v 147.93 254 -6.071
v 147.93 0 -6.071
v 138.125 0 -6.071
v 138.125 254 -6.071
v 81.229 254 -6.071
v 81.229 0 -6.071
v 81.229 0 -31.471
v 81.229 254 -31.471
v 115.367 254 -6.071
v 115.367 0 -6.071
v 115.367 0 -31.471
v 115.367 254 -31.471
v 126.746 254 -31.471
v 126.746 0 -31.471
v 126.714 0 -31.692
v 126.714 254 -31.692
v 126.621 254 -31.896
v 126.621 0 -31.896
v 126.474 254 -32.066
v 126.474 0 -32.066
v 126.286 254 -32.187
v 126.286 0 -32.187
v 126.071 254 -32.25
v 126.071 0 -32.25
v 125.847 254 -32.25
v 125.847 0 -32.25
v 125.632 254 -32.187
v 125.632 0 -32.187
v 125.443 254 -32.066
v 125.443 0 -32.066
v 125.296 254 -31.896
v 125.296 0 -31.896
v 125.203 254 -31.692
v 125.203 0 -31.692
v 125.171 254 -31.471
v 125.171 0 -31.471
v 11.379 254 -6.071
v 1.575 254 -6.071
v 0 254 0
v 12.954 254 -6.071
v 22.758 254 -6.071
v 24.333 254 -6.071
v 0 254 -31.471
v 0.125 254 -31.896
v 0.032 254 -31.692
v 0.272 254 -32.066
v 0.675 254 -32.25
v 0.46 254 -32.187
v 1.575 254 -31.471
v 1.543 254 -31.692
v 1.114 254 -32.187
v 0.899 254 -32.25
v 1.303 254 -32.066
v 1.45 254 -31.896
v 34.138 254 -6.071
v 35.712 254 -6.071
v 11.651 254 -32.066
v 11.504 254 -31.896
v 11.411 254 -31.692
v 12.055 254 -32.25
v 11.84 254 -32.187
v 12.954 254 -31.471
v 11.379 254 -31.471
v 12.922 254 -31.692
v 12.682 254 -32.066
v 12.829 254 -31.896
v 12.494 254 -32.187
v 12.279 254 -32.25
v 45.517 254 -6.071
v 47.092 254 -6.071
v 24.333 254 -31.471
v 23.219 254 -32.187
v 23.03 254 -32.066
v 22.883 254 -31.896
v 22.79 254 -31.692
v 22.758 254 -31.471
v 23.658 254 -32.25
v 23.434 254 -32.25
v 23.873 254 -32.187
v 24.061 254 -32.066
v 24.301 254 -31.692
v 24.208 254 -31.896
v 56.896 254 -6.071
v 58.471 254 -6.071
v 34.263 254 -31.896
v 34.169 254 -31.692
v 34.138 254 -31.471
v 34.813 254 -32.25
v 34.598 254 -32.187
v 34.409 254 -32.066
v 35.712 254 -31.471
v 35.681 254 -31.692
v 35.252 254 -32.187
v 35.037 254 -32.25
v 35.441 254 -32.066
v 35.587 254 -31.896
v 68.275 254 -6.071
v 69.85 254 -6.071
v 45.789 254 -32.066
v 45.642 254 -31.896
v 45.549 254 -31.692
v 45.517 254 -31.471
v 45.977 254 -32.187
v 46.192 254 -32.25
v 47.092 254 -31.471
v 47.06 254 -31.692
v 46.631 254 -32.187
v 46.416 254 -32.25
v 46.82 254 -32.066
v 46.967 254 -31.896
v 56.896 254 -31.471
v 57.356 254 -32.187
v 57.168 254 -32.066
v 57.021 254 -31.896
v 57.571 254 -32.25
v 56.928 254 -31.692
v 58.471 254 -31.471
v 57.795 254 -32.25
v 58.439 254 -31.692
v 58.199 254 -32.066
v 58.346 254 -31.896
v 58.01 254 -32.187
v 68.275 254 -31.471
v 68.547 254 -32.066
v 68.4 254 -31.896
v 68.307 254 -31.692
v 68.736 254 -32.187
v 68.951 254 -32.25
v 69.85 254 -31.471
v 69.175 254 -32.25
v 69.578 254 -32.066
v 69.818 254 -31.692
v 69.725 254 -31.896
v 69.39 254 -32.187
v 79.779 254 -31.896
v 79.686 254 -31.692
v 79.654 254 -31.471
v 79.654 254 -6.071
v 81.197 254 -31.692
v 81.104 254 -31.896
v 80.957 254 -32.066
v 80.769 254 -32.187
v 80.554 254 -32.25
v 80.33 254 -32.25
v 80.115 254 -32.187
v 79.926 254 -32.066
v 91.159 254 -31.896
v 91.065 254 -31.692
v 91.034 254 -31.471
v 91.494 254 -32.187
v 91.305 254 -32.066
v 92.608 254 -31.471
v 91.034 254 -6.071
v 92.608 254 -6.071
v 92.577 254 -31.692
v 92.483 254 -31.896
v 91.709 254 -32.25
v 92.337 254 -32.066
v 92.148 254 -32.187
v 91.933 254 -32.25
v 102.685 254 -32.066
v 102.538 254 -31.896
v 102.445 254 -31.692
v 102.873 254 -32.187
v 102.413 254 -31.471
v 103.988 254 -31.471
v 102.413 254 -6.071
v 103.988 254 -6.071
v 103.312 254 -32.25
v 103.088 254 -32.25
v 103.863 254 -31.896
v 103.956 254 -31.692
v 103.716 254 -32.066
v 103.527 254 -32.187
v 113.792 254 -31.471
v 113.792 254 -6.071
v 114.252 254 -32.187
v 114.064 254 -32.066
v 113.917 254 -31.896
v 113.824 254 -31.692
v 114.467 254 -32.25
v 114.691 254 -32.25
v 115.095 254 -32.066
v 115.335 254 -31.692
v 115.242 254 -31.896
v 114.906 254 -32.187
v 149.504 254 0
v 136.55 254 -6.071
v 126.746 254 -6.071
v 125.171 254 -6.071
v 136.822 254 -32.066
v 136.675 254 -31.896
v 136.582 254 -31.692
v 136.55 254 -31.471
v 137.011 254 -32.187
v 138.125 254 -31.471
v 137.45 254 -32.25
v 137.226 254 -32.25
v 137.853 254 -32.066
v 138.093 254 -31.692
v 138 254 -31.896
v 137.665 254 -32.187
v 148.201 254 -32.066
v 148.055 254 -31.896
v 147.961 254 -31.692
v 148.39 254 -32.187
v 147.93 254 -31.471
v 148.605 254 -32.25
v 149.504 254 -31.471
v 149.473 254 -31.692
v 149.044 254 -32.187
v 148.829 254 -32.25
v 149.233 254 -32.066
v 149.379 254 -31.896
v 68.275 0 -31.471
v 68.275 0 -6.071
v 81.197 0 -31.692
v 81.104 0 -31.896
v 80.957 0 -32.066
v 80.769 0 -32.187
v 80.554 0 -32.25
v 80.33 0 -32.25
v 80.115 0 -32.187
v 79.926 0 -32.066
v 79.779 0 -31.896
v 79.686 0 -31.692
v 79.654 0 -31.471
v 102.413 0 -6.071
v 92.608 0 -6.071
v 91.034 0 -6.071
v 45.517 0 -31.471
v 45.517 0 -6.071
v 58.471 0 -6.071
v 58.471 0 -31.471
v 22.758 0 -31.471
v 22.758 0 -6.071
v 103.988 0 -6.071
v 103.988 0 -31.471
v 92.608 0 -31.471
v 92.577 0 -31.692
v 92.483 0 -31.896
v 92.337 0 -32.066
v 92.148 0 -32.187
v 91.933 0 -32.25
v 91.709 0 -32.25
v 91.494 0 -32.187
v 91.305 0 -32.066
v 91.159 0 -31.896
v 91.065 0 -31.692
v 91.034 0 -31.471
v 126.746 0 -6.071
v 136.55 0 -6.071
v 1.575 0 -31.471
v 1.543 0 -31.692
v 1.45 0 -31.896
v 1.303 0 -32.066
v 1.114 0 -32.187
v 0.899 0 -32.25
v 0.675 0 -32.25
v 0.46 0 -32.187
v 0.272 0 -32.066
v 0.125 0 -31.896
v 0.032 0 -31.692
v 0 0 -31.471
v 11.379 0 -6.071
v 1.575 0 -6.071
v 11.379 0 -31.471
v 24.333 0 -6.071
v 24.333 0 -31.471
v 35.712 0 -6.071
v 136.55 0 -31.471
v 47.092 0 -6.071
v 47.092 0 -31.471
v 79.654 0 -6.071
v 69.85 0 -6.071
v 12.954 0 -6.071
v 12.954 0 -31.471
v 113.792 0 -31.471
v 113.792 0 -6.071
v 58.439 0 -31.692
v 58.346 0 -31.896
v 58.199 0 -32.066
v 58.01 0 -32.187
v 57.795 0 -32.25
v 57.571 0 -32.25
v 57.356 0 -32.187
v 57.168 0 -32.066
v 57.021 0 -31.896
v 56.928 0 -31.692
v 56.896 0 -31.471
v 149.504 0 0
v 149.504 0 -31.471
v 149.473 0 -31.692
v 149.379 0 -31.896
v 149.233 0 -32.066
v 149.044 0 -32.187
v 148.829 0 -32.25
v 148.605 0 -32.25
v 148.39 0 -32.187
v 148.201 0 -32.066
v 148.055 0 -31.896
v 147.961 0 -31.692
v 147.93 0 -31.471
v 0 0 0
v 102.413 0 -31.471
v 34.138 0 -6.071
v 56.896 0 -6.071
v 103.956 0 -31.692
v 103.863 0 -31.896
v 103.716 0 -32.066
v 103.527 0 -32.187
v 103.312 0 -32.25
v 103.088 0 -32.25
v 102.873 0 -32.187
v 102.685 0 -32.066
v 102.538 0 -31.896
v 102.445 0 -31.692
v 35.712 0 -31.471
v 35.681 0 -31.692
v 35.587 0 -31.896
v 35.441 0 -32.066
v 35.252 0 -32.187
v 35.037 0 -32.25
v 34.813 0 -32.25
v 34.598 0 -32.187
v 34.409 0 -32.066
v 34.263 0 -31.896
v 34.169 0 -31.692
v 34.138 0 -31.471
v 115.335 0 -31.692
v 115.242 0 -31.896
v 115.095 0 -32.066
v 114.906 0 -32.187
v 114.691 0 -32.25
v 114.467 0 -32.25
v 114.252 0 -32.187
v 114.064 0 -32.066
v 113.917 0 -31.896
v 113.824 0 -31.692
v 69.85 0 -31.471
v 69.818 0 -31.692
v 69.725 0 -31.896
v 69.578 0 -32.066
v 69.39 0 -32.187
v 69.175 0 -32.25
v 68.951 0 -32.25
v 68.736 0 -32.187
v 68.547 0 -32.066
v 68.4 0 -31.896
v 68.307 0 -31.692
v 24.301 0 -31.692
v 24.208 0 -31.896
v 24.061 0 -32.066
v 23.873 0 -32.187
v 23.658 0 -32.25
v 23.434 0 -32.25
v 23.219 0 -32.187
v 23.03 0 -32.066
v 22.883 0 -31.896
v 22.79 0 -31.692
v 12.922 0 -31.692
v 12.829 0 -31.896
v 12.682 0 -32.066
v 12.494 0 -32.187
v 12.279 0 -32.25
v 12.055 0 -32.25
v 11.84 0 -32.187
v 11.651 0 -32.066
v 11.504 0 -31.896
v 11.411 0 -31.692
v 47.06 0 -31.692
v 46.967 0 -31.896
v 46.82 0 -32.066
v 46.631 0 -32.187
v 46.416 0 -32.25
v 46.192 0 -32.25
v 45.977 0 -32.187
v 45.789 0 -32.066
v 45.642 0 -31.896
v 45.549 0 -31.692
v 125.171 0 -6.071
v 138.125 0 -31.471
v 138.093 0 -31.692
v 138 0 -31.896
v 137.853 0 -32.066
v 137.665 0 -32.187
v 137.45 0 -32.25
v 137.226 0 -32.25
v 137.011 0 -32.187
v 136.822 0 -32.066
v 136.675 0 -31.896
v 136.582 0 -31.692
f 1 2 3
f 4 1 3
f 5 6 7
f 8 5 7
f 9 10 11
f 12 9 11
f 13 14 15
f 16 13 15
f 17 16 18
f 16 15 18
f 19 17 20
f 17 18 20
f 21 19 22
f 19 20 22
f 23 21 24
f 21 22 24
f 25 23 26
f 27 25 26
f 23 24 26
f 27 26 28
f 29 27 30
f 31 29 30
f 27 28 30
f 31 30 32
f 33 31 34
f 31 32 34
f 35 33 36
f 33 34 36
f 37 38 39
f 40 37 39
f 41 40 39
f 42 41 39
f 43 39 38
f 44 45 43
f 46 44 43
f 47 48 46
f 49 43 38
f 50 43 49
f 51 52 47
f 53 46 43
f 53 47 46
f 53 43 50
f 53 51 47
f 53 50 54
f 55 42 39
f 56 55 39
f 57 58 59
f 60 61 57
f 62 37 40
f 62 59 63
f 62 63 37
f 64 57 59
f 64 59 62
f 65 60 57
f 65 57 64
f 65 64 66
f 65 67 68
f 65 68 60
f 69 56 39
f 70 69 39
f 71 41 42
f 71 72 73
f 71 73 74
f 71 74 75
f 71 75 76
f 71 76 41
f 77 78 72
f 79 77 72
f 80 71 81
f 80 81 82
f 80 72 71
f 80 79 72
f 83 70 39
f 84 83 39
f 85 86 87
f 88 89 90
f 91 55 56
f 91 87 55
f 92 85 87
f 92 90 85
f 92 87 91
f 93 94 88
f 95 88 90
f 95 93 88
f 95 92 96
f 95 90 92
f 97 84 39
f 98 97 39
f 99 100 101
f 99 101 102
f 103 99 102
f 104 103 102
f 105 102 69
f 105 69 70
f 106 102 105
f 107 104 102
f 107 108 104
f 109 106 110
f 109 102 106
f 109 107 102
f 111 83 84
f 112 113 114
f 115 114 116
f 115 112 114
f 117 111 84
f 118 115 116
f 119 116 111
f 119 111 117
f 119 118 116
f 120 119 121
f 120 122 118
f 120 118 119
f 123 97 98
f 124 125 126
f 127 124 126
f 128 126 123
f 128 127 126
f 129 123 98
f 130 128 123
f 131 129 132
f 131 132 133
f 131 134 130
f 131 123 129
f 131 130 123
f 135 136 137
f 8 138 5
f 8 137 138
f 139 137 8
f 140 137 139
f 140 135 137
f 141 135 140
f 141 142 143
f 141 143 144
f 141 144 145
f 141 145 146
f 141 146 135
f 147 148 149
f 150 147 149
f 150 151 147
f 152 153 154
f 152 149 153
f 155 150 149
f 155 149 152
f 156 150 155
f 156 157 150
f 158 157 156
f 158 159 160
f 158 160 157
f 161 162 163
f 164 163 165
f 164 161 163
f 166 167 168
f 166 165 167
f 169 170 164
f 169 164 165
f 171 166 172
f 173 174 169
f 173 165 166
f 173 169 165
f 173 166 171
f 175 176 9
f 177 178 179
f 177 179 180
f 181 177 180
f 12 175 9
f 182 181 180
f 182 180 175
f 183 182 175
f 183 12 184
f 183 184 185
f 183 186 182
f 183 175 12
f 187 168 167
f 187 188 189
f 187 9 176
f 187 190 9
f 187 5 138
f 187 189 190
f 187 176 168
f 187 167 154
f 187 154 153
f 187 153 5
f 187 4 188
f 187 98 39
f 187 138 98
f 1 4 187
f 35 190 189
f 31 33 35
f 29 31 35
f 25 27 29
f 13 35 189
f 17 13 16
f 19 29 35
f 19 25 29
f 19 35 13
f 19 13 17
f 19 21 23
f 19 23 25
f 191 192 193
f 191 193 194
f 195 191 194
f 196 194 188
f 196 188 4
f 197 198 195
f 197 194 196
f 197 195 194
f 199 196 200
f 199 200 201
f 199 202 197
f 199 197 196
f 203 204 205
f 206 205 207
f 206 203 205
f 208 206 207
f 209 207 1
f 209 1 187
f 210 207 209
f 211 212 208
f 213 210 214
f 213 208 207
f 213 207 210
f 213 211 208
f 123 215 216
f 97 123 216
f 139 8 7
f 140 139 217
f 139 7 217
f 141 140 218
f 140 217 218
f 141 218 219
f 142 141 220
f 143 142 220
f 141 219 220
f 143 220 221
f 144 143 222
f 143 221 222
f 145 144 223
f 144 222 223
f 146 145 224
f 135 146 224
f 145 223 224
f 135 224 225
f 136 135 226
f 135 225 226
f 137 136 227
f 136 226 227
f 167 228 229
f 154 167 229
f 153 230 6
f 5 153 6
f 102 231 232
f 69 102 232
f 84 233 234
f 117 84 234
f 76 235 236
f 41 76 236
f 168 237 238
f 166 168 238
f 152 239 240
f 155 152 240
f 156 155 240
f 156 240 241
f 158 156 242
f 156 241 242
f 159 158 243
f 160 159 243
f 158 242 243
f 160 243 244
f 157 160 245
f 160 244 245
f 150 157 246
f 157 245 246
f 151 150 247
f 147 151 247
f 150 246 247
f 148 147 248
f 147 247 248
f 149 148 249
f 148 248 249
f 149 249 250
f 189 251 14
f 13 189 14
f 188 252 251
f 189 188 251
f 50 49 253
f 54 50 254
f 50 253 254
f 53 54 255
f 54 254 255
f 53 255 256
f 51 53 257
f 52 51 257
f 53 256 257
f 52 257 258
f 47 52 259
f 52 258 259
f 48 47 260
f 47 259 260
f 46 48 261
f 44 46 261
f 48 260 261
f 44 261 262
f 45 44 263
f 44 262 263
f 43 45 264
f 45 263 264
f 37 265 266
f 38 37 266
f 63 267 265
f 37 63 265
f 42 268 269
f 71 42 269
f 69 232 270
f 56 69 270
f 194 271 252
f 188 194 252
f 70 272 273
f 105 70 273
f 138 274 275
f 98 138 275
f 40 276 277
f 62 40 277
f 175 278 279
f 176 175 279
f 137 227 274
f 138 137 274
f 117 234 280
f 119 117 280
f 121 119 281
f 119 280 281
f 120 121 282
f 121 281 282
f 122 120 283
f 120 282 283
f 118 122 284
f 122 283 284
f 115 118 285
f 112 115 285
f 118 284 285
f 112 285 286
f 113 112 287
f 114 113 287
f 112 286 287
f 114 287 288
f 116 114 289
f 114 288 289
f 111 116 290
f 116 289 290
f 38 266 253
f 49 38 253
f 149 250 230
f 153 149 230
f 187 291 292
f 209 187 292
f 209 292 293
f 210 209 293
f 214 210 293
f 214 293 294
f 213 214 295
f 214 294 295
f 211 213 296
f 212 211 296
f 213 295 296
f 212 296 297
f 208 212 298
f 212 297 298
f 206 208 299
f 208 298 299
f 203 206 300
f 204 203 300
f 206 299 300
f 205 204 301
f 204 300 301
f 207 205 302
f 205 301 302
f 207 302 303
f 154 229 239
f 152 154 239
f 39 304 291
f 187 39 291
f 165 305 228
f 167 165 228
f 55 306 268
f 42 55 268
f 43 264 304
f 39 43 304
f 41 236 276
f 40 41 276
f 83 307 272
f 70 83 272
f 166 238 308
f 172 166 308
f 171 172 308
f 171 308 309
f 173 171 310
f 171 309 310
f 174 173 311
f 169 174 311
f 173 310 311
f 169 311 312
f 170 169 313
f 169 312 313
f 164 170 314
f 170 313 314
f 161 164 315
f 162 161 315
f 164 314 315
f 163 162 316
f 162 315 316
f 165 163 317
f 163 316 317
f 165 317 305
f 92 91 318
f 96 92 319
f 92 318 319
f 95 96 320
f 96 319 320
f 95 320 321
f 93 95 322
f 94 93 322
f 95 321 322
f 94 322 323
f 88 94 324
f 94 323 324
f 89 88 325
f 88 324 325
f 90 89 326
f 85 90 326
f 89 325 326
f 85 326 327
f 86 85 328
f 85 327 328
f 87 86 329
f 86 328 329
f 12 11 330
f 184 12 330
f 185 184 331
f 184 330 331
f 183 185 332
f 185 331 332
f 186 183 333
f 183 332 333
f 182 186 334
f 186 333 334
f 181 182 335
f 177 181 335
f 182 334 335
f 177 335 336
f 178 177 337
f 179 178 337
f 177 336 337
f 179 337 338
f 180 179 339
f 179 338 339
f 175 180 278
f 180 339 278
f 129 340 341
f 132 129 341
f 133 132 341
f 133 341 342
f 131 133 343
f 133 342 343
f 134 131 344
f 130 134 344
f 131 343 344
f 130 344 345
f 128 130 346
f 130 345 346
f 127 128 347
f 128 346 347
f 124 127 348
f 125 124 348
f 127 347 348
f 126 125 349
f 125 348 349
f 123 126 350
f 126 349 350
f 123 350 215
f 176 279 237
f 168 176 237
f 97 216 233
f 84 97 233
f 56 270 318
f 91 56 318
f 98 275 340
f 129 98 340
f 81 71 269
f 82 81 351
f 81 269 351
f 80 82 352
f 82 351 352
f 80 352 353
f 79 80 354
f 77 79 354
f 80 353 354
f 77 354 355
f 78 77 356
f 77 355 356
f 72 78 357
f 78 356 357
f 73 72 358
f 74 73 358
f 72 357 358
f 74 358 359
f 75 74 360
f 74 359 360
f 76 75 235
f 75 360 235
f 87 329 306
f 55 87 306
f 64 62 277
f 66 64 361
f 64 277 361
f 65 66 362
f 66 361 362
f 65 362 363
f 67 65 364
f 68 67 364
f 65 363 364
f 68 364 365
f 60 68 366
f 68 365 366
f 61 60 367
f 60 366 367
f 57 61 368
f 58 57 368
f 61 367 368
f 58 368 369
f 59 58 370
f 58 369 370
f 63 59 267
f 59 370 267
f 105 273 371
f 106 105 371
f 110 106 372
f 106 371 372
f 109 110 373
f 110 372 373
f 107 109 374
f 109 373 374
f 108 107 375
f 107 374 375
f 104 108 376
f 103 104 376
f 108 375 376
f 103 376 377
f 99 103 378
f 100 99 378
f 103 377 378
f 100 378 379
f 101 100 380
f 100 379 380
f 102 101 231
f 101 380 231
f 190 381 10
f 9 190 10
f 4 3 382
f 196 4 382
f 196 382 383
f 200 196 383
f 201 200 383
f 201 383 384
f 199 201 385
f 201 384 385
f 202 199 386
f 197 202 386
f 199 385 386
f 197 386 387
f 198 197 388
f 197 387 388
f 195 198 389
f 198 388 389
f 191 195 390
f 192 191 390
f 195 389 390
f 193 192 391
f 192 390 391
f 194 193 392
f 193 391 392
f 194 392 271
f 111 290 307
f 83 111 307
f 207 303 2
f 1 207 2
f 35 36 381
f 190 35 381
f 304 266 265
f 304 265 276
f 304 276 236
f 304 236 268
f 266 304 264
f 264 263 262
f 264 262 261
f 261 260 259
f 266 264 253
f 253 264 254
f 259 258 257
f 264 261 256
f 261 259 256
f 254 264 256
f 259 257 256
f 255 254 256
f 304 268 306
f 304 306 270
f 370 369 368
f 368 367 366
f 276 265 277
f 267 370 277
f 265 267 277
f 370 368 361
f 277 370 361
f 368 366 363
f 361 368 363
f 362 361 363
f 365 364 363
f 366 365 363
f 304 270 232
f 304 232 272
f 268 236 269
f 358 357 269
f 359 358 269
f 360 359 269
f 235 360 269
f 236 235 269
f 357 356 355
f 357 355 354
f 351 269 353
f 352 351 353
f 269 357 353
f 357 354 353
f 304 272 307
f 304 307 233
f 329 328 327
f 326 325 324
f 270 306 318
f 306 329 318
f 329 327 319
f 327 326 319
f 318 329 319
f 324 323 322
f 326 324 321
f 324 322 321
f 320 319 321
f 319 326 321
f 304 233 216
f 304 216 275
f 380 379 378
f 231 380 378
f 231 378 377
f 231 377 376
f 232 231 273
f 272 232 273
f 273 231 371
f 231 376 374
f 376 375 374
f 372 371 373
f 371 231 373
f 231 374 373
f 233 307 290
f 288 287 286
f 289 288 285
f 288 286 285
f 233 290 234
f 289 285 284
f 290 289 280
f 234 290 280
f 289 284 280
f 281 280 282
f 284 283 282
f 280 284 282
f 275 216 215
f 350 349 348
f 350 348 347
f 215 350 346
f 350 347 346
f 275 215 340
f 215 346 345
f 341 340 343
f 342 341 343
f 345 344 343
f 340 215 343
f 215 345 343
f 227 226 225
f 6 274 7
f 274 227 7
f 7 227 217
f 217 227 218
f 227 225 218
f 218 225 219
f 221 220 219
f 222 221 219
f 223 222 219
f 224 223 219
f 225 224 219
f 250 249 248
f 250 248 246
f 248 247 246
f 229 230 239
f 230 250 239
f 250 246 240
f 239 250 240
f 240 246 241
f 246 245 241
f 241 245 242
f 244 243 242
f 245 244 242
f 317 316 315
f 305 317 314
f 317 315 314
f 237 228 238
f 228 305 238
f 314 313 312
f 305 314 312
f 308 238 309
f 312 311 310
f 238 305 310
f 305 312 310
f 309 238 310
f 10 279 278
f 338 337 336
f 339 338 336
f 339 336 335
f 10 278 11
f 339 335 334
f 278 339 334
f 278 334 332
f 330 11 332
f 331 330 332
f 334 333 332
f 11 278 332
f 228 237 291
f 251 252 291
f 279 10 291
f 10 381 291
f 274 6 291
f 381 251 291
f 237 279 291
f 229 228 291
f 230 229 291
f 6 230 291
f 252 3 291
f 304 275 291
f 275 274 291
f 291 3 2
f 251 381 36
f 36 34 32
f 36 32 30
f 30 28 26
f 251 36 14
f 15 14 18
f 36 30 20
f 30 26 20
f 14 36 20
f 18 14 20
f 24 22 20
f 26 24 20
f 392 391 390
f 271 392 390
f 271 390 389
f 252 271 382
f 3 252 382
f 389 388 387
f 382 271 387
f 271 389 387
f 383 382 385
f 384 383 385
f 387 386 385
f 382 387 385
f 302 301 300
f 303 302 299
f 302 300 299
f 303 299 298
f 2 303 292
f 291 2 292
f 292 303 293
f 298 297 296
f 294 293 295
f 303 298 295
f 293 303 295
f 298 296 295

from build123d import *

# Parameters (mm, degrees)
BOSS_EXTRUDE1_DEPTH = 254


with BuildPart() as part:
    # Sketch1 → Boss-Extrude1 (new body)
    with BuildSketch(Plane(origin=(0, 0, 0), x_dir=(1, 0, 0), z_dir=(0, 1, 0))):
        with BuildLine():
            Line((0, 0), (149.5044, 0))
            Line((149.5044, 0), (149.5044, 6.0706))
            Line((149.5044, 6.0706), (149.5044, 31.4706))
            ThreePointArc((149.5044, 31.4706), (148.717, 32.258), (147.9296, 31.4706))
            Line((147.9296, 31.4706), (147.9296, 6.0706))
            Line((147.9296, 6.0706), (138.1252, 6.0706))
            Line((138.1252, 6.0706), (138.1252, 31.4706))
            ThreePointArc((138.1252, 31.4706), (137.3378, 32.258), (136.5504, 31.4706))
            Line((136.5504, 31.4706), (136.5504, 6.0706))
            Line((136.5504, 6.0706), (126.746, 6.0706))
            Line((126.746, 6.0706), (126.746, 31.4706))
            ThreePointArc((126.746, 31.4706), (125.9586, 32.258), (125.1712, 31.4706))
            Line((125.1712, 31.4706), (125.1712, 6.0706))
            Line((125.1712, 6.0706), (115.3668, 6.0706))
            Line((115.3668, 6.0706), (115.3668, 31.4706))
            ThreePointArc((115.3668, 31.4706), (114.5794, 32.258), (113.792, 31.4706))
            Line((113.792, 31.4706), (113.792, 6.0706))
            Line((113.792, 6.0706), (103.9876, 6.0706))
            Line((103.9876, 6.0706), (103.9876, 31.4706))
            ThreePointArc((103.9876, 31.4706), (103.2002, 32.258), (102.4128, 31.4706))
            Line((102.4128, 31.4706), (102.4128, 6.0706))
            Line((102.4128, 6.0706), (92.6084, 6.0706))
            Line((92.6084, 6.0706), (92.6084, 31.4706))
            ThreePointArc((92.6084, 31.4706), (91.821, 32.258), (91.0336, 31.4706))
            Line((91.0336, 31.4706), (91.0336, 6.0706))
            Line((91.0336, 6.0706), (81.2292, 6.0706))
            Line((81.2292, 6.0706), (81.2292, 31.4706))
            ThreePointArc((81.2292, 31.4706), (80.4418, 32.258), (79.6544, 31.4706))
            Line((79.6544, 31.4706), (79.6544, 6.0706))
            Line((79.6544, 6.0706), (69.85, 6.0706))
            Line((69.85, 6.0706), (69.85, 31.4706))
            ThreePointArc((69.85, 31.4706), (69.0626, 32.258), (68.2752, 31.4706))
            Line((68.2752, 31.4706), (68.2752, 6.0706))
            Line((68.2752, 6.0706), (58.4708, 6.0706))
            Line((58.4708, 6.0706), (58.4708, 31.4706))
            ThreePointArc((58.4708, 31.4706), (57.6834, 32.258), (56.896, 31.4706))
            Line((56.896, 31.4706), (56.896, 6.0706))
            Line((56.896, 6.0706), (47.0916, 6.0706))
            Line((47.0916, 6.0706), (47.0916, 31.4706))
            ThreePointArc((47.0916, 31.4706), (46.3042, 32.258), (45.5168, 31.4706))
            Line((45.5168, 31.4706), (45.5168, 6.0706))
            Line((45.5168, 6.0706), (35.7124, 6.0706))
            Line((35.7124, 6.0706), (35.7124, 31.4706))
            ThreePointArc((35.7124, 31.4706), (34.925, 32.258), (34.1376, 31.4706))
            Line((34.1376, 31.4706), (34.1376, 6.0706))
            Line((34.1376, 6.0706), (24.3332, 6.0706))
            Line((24.3332, 6.0706), (24.3332, 31.4706))
            ThreePointArc((24.3332, 31.4706), (23.5458, 32.258), (22.7584, 31.4706))
            Line((22.7584, 31.4706), (22.7584, 6.0706))
            Line((22.7584, 6.0706), (12.954, 6.0706))
            Line((12.954, 6.0706), (12.954, 31.4706))
            ThreePointArc((12.954, 31.4706), (12.1666, 32.258), (11.3792, 31.4706))
            Line((11.3792, 31.4706), (11.3792, 6.0706))
            Line((11.3792, 6.0706), (1.5748, 6.0706))
            Line((1.5748, 6.0706), (1.5748, 31.4706))
            ThreePointArc((1.5748, 31.4706), (0.7874, 32.258), (0, 31.4706))
            Line((0, 31.4706), (0, 0))
        make_face()
    extrude(amount=BOSS_EXTRUDE1_DEPTH)


solid = part.part
